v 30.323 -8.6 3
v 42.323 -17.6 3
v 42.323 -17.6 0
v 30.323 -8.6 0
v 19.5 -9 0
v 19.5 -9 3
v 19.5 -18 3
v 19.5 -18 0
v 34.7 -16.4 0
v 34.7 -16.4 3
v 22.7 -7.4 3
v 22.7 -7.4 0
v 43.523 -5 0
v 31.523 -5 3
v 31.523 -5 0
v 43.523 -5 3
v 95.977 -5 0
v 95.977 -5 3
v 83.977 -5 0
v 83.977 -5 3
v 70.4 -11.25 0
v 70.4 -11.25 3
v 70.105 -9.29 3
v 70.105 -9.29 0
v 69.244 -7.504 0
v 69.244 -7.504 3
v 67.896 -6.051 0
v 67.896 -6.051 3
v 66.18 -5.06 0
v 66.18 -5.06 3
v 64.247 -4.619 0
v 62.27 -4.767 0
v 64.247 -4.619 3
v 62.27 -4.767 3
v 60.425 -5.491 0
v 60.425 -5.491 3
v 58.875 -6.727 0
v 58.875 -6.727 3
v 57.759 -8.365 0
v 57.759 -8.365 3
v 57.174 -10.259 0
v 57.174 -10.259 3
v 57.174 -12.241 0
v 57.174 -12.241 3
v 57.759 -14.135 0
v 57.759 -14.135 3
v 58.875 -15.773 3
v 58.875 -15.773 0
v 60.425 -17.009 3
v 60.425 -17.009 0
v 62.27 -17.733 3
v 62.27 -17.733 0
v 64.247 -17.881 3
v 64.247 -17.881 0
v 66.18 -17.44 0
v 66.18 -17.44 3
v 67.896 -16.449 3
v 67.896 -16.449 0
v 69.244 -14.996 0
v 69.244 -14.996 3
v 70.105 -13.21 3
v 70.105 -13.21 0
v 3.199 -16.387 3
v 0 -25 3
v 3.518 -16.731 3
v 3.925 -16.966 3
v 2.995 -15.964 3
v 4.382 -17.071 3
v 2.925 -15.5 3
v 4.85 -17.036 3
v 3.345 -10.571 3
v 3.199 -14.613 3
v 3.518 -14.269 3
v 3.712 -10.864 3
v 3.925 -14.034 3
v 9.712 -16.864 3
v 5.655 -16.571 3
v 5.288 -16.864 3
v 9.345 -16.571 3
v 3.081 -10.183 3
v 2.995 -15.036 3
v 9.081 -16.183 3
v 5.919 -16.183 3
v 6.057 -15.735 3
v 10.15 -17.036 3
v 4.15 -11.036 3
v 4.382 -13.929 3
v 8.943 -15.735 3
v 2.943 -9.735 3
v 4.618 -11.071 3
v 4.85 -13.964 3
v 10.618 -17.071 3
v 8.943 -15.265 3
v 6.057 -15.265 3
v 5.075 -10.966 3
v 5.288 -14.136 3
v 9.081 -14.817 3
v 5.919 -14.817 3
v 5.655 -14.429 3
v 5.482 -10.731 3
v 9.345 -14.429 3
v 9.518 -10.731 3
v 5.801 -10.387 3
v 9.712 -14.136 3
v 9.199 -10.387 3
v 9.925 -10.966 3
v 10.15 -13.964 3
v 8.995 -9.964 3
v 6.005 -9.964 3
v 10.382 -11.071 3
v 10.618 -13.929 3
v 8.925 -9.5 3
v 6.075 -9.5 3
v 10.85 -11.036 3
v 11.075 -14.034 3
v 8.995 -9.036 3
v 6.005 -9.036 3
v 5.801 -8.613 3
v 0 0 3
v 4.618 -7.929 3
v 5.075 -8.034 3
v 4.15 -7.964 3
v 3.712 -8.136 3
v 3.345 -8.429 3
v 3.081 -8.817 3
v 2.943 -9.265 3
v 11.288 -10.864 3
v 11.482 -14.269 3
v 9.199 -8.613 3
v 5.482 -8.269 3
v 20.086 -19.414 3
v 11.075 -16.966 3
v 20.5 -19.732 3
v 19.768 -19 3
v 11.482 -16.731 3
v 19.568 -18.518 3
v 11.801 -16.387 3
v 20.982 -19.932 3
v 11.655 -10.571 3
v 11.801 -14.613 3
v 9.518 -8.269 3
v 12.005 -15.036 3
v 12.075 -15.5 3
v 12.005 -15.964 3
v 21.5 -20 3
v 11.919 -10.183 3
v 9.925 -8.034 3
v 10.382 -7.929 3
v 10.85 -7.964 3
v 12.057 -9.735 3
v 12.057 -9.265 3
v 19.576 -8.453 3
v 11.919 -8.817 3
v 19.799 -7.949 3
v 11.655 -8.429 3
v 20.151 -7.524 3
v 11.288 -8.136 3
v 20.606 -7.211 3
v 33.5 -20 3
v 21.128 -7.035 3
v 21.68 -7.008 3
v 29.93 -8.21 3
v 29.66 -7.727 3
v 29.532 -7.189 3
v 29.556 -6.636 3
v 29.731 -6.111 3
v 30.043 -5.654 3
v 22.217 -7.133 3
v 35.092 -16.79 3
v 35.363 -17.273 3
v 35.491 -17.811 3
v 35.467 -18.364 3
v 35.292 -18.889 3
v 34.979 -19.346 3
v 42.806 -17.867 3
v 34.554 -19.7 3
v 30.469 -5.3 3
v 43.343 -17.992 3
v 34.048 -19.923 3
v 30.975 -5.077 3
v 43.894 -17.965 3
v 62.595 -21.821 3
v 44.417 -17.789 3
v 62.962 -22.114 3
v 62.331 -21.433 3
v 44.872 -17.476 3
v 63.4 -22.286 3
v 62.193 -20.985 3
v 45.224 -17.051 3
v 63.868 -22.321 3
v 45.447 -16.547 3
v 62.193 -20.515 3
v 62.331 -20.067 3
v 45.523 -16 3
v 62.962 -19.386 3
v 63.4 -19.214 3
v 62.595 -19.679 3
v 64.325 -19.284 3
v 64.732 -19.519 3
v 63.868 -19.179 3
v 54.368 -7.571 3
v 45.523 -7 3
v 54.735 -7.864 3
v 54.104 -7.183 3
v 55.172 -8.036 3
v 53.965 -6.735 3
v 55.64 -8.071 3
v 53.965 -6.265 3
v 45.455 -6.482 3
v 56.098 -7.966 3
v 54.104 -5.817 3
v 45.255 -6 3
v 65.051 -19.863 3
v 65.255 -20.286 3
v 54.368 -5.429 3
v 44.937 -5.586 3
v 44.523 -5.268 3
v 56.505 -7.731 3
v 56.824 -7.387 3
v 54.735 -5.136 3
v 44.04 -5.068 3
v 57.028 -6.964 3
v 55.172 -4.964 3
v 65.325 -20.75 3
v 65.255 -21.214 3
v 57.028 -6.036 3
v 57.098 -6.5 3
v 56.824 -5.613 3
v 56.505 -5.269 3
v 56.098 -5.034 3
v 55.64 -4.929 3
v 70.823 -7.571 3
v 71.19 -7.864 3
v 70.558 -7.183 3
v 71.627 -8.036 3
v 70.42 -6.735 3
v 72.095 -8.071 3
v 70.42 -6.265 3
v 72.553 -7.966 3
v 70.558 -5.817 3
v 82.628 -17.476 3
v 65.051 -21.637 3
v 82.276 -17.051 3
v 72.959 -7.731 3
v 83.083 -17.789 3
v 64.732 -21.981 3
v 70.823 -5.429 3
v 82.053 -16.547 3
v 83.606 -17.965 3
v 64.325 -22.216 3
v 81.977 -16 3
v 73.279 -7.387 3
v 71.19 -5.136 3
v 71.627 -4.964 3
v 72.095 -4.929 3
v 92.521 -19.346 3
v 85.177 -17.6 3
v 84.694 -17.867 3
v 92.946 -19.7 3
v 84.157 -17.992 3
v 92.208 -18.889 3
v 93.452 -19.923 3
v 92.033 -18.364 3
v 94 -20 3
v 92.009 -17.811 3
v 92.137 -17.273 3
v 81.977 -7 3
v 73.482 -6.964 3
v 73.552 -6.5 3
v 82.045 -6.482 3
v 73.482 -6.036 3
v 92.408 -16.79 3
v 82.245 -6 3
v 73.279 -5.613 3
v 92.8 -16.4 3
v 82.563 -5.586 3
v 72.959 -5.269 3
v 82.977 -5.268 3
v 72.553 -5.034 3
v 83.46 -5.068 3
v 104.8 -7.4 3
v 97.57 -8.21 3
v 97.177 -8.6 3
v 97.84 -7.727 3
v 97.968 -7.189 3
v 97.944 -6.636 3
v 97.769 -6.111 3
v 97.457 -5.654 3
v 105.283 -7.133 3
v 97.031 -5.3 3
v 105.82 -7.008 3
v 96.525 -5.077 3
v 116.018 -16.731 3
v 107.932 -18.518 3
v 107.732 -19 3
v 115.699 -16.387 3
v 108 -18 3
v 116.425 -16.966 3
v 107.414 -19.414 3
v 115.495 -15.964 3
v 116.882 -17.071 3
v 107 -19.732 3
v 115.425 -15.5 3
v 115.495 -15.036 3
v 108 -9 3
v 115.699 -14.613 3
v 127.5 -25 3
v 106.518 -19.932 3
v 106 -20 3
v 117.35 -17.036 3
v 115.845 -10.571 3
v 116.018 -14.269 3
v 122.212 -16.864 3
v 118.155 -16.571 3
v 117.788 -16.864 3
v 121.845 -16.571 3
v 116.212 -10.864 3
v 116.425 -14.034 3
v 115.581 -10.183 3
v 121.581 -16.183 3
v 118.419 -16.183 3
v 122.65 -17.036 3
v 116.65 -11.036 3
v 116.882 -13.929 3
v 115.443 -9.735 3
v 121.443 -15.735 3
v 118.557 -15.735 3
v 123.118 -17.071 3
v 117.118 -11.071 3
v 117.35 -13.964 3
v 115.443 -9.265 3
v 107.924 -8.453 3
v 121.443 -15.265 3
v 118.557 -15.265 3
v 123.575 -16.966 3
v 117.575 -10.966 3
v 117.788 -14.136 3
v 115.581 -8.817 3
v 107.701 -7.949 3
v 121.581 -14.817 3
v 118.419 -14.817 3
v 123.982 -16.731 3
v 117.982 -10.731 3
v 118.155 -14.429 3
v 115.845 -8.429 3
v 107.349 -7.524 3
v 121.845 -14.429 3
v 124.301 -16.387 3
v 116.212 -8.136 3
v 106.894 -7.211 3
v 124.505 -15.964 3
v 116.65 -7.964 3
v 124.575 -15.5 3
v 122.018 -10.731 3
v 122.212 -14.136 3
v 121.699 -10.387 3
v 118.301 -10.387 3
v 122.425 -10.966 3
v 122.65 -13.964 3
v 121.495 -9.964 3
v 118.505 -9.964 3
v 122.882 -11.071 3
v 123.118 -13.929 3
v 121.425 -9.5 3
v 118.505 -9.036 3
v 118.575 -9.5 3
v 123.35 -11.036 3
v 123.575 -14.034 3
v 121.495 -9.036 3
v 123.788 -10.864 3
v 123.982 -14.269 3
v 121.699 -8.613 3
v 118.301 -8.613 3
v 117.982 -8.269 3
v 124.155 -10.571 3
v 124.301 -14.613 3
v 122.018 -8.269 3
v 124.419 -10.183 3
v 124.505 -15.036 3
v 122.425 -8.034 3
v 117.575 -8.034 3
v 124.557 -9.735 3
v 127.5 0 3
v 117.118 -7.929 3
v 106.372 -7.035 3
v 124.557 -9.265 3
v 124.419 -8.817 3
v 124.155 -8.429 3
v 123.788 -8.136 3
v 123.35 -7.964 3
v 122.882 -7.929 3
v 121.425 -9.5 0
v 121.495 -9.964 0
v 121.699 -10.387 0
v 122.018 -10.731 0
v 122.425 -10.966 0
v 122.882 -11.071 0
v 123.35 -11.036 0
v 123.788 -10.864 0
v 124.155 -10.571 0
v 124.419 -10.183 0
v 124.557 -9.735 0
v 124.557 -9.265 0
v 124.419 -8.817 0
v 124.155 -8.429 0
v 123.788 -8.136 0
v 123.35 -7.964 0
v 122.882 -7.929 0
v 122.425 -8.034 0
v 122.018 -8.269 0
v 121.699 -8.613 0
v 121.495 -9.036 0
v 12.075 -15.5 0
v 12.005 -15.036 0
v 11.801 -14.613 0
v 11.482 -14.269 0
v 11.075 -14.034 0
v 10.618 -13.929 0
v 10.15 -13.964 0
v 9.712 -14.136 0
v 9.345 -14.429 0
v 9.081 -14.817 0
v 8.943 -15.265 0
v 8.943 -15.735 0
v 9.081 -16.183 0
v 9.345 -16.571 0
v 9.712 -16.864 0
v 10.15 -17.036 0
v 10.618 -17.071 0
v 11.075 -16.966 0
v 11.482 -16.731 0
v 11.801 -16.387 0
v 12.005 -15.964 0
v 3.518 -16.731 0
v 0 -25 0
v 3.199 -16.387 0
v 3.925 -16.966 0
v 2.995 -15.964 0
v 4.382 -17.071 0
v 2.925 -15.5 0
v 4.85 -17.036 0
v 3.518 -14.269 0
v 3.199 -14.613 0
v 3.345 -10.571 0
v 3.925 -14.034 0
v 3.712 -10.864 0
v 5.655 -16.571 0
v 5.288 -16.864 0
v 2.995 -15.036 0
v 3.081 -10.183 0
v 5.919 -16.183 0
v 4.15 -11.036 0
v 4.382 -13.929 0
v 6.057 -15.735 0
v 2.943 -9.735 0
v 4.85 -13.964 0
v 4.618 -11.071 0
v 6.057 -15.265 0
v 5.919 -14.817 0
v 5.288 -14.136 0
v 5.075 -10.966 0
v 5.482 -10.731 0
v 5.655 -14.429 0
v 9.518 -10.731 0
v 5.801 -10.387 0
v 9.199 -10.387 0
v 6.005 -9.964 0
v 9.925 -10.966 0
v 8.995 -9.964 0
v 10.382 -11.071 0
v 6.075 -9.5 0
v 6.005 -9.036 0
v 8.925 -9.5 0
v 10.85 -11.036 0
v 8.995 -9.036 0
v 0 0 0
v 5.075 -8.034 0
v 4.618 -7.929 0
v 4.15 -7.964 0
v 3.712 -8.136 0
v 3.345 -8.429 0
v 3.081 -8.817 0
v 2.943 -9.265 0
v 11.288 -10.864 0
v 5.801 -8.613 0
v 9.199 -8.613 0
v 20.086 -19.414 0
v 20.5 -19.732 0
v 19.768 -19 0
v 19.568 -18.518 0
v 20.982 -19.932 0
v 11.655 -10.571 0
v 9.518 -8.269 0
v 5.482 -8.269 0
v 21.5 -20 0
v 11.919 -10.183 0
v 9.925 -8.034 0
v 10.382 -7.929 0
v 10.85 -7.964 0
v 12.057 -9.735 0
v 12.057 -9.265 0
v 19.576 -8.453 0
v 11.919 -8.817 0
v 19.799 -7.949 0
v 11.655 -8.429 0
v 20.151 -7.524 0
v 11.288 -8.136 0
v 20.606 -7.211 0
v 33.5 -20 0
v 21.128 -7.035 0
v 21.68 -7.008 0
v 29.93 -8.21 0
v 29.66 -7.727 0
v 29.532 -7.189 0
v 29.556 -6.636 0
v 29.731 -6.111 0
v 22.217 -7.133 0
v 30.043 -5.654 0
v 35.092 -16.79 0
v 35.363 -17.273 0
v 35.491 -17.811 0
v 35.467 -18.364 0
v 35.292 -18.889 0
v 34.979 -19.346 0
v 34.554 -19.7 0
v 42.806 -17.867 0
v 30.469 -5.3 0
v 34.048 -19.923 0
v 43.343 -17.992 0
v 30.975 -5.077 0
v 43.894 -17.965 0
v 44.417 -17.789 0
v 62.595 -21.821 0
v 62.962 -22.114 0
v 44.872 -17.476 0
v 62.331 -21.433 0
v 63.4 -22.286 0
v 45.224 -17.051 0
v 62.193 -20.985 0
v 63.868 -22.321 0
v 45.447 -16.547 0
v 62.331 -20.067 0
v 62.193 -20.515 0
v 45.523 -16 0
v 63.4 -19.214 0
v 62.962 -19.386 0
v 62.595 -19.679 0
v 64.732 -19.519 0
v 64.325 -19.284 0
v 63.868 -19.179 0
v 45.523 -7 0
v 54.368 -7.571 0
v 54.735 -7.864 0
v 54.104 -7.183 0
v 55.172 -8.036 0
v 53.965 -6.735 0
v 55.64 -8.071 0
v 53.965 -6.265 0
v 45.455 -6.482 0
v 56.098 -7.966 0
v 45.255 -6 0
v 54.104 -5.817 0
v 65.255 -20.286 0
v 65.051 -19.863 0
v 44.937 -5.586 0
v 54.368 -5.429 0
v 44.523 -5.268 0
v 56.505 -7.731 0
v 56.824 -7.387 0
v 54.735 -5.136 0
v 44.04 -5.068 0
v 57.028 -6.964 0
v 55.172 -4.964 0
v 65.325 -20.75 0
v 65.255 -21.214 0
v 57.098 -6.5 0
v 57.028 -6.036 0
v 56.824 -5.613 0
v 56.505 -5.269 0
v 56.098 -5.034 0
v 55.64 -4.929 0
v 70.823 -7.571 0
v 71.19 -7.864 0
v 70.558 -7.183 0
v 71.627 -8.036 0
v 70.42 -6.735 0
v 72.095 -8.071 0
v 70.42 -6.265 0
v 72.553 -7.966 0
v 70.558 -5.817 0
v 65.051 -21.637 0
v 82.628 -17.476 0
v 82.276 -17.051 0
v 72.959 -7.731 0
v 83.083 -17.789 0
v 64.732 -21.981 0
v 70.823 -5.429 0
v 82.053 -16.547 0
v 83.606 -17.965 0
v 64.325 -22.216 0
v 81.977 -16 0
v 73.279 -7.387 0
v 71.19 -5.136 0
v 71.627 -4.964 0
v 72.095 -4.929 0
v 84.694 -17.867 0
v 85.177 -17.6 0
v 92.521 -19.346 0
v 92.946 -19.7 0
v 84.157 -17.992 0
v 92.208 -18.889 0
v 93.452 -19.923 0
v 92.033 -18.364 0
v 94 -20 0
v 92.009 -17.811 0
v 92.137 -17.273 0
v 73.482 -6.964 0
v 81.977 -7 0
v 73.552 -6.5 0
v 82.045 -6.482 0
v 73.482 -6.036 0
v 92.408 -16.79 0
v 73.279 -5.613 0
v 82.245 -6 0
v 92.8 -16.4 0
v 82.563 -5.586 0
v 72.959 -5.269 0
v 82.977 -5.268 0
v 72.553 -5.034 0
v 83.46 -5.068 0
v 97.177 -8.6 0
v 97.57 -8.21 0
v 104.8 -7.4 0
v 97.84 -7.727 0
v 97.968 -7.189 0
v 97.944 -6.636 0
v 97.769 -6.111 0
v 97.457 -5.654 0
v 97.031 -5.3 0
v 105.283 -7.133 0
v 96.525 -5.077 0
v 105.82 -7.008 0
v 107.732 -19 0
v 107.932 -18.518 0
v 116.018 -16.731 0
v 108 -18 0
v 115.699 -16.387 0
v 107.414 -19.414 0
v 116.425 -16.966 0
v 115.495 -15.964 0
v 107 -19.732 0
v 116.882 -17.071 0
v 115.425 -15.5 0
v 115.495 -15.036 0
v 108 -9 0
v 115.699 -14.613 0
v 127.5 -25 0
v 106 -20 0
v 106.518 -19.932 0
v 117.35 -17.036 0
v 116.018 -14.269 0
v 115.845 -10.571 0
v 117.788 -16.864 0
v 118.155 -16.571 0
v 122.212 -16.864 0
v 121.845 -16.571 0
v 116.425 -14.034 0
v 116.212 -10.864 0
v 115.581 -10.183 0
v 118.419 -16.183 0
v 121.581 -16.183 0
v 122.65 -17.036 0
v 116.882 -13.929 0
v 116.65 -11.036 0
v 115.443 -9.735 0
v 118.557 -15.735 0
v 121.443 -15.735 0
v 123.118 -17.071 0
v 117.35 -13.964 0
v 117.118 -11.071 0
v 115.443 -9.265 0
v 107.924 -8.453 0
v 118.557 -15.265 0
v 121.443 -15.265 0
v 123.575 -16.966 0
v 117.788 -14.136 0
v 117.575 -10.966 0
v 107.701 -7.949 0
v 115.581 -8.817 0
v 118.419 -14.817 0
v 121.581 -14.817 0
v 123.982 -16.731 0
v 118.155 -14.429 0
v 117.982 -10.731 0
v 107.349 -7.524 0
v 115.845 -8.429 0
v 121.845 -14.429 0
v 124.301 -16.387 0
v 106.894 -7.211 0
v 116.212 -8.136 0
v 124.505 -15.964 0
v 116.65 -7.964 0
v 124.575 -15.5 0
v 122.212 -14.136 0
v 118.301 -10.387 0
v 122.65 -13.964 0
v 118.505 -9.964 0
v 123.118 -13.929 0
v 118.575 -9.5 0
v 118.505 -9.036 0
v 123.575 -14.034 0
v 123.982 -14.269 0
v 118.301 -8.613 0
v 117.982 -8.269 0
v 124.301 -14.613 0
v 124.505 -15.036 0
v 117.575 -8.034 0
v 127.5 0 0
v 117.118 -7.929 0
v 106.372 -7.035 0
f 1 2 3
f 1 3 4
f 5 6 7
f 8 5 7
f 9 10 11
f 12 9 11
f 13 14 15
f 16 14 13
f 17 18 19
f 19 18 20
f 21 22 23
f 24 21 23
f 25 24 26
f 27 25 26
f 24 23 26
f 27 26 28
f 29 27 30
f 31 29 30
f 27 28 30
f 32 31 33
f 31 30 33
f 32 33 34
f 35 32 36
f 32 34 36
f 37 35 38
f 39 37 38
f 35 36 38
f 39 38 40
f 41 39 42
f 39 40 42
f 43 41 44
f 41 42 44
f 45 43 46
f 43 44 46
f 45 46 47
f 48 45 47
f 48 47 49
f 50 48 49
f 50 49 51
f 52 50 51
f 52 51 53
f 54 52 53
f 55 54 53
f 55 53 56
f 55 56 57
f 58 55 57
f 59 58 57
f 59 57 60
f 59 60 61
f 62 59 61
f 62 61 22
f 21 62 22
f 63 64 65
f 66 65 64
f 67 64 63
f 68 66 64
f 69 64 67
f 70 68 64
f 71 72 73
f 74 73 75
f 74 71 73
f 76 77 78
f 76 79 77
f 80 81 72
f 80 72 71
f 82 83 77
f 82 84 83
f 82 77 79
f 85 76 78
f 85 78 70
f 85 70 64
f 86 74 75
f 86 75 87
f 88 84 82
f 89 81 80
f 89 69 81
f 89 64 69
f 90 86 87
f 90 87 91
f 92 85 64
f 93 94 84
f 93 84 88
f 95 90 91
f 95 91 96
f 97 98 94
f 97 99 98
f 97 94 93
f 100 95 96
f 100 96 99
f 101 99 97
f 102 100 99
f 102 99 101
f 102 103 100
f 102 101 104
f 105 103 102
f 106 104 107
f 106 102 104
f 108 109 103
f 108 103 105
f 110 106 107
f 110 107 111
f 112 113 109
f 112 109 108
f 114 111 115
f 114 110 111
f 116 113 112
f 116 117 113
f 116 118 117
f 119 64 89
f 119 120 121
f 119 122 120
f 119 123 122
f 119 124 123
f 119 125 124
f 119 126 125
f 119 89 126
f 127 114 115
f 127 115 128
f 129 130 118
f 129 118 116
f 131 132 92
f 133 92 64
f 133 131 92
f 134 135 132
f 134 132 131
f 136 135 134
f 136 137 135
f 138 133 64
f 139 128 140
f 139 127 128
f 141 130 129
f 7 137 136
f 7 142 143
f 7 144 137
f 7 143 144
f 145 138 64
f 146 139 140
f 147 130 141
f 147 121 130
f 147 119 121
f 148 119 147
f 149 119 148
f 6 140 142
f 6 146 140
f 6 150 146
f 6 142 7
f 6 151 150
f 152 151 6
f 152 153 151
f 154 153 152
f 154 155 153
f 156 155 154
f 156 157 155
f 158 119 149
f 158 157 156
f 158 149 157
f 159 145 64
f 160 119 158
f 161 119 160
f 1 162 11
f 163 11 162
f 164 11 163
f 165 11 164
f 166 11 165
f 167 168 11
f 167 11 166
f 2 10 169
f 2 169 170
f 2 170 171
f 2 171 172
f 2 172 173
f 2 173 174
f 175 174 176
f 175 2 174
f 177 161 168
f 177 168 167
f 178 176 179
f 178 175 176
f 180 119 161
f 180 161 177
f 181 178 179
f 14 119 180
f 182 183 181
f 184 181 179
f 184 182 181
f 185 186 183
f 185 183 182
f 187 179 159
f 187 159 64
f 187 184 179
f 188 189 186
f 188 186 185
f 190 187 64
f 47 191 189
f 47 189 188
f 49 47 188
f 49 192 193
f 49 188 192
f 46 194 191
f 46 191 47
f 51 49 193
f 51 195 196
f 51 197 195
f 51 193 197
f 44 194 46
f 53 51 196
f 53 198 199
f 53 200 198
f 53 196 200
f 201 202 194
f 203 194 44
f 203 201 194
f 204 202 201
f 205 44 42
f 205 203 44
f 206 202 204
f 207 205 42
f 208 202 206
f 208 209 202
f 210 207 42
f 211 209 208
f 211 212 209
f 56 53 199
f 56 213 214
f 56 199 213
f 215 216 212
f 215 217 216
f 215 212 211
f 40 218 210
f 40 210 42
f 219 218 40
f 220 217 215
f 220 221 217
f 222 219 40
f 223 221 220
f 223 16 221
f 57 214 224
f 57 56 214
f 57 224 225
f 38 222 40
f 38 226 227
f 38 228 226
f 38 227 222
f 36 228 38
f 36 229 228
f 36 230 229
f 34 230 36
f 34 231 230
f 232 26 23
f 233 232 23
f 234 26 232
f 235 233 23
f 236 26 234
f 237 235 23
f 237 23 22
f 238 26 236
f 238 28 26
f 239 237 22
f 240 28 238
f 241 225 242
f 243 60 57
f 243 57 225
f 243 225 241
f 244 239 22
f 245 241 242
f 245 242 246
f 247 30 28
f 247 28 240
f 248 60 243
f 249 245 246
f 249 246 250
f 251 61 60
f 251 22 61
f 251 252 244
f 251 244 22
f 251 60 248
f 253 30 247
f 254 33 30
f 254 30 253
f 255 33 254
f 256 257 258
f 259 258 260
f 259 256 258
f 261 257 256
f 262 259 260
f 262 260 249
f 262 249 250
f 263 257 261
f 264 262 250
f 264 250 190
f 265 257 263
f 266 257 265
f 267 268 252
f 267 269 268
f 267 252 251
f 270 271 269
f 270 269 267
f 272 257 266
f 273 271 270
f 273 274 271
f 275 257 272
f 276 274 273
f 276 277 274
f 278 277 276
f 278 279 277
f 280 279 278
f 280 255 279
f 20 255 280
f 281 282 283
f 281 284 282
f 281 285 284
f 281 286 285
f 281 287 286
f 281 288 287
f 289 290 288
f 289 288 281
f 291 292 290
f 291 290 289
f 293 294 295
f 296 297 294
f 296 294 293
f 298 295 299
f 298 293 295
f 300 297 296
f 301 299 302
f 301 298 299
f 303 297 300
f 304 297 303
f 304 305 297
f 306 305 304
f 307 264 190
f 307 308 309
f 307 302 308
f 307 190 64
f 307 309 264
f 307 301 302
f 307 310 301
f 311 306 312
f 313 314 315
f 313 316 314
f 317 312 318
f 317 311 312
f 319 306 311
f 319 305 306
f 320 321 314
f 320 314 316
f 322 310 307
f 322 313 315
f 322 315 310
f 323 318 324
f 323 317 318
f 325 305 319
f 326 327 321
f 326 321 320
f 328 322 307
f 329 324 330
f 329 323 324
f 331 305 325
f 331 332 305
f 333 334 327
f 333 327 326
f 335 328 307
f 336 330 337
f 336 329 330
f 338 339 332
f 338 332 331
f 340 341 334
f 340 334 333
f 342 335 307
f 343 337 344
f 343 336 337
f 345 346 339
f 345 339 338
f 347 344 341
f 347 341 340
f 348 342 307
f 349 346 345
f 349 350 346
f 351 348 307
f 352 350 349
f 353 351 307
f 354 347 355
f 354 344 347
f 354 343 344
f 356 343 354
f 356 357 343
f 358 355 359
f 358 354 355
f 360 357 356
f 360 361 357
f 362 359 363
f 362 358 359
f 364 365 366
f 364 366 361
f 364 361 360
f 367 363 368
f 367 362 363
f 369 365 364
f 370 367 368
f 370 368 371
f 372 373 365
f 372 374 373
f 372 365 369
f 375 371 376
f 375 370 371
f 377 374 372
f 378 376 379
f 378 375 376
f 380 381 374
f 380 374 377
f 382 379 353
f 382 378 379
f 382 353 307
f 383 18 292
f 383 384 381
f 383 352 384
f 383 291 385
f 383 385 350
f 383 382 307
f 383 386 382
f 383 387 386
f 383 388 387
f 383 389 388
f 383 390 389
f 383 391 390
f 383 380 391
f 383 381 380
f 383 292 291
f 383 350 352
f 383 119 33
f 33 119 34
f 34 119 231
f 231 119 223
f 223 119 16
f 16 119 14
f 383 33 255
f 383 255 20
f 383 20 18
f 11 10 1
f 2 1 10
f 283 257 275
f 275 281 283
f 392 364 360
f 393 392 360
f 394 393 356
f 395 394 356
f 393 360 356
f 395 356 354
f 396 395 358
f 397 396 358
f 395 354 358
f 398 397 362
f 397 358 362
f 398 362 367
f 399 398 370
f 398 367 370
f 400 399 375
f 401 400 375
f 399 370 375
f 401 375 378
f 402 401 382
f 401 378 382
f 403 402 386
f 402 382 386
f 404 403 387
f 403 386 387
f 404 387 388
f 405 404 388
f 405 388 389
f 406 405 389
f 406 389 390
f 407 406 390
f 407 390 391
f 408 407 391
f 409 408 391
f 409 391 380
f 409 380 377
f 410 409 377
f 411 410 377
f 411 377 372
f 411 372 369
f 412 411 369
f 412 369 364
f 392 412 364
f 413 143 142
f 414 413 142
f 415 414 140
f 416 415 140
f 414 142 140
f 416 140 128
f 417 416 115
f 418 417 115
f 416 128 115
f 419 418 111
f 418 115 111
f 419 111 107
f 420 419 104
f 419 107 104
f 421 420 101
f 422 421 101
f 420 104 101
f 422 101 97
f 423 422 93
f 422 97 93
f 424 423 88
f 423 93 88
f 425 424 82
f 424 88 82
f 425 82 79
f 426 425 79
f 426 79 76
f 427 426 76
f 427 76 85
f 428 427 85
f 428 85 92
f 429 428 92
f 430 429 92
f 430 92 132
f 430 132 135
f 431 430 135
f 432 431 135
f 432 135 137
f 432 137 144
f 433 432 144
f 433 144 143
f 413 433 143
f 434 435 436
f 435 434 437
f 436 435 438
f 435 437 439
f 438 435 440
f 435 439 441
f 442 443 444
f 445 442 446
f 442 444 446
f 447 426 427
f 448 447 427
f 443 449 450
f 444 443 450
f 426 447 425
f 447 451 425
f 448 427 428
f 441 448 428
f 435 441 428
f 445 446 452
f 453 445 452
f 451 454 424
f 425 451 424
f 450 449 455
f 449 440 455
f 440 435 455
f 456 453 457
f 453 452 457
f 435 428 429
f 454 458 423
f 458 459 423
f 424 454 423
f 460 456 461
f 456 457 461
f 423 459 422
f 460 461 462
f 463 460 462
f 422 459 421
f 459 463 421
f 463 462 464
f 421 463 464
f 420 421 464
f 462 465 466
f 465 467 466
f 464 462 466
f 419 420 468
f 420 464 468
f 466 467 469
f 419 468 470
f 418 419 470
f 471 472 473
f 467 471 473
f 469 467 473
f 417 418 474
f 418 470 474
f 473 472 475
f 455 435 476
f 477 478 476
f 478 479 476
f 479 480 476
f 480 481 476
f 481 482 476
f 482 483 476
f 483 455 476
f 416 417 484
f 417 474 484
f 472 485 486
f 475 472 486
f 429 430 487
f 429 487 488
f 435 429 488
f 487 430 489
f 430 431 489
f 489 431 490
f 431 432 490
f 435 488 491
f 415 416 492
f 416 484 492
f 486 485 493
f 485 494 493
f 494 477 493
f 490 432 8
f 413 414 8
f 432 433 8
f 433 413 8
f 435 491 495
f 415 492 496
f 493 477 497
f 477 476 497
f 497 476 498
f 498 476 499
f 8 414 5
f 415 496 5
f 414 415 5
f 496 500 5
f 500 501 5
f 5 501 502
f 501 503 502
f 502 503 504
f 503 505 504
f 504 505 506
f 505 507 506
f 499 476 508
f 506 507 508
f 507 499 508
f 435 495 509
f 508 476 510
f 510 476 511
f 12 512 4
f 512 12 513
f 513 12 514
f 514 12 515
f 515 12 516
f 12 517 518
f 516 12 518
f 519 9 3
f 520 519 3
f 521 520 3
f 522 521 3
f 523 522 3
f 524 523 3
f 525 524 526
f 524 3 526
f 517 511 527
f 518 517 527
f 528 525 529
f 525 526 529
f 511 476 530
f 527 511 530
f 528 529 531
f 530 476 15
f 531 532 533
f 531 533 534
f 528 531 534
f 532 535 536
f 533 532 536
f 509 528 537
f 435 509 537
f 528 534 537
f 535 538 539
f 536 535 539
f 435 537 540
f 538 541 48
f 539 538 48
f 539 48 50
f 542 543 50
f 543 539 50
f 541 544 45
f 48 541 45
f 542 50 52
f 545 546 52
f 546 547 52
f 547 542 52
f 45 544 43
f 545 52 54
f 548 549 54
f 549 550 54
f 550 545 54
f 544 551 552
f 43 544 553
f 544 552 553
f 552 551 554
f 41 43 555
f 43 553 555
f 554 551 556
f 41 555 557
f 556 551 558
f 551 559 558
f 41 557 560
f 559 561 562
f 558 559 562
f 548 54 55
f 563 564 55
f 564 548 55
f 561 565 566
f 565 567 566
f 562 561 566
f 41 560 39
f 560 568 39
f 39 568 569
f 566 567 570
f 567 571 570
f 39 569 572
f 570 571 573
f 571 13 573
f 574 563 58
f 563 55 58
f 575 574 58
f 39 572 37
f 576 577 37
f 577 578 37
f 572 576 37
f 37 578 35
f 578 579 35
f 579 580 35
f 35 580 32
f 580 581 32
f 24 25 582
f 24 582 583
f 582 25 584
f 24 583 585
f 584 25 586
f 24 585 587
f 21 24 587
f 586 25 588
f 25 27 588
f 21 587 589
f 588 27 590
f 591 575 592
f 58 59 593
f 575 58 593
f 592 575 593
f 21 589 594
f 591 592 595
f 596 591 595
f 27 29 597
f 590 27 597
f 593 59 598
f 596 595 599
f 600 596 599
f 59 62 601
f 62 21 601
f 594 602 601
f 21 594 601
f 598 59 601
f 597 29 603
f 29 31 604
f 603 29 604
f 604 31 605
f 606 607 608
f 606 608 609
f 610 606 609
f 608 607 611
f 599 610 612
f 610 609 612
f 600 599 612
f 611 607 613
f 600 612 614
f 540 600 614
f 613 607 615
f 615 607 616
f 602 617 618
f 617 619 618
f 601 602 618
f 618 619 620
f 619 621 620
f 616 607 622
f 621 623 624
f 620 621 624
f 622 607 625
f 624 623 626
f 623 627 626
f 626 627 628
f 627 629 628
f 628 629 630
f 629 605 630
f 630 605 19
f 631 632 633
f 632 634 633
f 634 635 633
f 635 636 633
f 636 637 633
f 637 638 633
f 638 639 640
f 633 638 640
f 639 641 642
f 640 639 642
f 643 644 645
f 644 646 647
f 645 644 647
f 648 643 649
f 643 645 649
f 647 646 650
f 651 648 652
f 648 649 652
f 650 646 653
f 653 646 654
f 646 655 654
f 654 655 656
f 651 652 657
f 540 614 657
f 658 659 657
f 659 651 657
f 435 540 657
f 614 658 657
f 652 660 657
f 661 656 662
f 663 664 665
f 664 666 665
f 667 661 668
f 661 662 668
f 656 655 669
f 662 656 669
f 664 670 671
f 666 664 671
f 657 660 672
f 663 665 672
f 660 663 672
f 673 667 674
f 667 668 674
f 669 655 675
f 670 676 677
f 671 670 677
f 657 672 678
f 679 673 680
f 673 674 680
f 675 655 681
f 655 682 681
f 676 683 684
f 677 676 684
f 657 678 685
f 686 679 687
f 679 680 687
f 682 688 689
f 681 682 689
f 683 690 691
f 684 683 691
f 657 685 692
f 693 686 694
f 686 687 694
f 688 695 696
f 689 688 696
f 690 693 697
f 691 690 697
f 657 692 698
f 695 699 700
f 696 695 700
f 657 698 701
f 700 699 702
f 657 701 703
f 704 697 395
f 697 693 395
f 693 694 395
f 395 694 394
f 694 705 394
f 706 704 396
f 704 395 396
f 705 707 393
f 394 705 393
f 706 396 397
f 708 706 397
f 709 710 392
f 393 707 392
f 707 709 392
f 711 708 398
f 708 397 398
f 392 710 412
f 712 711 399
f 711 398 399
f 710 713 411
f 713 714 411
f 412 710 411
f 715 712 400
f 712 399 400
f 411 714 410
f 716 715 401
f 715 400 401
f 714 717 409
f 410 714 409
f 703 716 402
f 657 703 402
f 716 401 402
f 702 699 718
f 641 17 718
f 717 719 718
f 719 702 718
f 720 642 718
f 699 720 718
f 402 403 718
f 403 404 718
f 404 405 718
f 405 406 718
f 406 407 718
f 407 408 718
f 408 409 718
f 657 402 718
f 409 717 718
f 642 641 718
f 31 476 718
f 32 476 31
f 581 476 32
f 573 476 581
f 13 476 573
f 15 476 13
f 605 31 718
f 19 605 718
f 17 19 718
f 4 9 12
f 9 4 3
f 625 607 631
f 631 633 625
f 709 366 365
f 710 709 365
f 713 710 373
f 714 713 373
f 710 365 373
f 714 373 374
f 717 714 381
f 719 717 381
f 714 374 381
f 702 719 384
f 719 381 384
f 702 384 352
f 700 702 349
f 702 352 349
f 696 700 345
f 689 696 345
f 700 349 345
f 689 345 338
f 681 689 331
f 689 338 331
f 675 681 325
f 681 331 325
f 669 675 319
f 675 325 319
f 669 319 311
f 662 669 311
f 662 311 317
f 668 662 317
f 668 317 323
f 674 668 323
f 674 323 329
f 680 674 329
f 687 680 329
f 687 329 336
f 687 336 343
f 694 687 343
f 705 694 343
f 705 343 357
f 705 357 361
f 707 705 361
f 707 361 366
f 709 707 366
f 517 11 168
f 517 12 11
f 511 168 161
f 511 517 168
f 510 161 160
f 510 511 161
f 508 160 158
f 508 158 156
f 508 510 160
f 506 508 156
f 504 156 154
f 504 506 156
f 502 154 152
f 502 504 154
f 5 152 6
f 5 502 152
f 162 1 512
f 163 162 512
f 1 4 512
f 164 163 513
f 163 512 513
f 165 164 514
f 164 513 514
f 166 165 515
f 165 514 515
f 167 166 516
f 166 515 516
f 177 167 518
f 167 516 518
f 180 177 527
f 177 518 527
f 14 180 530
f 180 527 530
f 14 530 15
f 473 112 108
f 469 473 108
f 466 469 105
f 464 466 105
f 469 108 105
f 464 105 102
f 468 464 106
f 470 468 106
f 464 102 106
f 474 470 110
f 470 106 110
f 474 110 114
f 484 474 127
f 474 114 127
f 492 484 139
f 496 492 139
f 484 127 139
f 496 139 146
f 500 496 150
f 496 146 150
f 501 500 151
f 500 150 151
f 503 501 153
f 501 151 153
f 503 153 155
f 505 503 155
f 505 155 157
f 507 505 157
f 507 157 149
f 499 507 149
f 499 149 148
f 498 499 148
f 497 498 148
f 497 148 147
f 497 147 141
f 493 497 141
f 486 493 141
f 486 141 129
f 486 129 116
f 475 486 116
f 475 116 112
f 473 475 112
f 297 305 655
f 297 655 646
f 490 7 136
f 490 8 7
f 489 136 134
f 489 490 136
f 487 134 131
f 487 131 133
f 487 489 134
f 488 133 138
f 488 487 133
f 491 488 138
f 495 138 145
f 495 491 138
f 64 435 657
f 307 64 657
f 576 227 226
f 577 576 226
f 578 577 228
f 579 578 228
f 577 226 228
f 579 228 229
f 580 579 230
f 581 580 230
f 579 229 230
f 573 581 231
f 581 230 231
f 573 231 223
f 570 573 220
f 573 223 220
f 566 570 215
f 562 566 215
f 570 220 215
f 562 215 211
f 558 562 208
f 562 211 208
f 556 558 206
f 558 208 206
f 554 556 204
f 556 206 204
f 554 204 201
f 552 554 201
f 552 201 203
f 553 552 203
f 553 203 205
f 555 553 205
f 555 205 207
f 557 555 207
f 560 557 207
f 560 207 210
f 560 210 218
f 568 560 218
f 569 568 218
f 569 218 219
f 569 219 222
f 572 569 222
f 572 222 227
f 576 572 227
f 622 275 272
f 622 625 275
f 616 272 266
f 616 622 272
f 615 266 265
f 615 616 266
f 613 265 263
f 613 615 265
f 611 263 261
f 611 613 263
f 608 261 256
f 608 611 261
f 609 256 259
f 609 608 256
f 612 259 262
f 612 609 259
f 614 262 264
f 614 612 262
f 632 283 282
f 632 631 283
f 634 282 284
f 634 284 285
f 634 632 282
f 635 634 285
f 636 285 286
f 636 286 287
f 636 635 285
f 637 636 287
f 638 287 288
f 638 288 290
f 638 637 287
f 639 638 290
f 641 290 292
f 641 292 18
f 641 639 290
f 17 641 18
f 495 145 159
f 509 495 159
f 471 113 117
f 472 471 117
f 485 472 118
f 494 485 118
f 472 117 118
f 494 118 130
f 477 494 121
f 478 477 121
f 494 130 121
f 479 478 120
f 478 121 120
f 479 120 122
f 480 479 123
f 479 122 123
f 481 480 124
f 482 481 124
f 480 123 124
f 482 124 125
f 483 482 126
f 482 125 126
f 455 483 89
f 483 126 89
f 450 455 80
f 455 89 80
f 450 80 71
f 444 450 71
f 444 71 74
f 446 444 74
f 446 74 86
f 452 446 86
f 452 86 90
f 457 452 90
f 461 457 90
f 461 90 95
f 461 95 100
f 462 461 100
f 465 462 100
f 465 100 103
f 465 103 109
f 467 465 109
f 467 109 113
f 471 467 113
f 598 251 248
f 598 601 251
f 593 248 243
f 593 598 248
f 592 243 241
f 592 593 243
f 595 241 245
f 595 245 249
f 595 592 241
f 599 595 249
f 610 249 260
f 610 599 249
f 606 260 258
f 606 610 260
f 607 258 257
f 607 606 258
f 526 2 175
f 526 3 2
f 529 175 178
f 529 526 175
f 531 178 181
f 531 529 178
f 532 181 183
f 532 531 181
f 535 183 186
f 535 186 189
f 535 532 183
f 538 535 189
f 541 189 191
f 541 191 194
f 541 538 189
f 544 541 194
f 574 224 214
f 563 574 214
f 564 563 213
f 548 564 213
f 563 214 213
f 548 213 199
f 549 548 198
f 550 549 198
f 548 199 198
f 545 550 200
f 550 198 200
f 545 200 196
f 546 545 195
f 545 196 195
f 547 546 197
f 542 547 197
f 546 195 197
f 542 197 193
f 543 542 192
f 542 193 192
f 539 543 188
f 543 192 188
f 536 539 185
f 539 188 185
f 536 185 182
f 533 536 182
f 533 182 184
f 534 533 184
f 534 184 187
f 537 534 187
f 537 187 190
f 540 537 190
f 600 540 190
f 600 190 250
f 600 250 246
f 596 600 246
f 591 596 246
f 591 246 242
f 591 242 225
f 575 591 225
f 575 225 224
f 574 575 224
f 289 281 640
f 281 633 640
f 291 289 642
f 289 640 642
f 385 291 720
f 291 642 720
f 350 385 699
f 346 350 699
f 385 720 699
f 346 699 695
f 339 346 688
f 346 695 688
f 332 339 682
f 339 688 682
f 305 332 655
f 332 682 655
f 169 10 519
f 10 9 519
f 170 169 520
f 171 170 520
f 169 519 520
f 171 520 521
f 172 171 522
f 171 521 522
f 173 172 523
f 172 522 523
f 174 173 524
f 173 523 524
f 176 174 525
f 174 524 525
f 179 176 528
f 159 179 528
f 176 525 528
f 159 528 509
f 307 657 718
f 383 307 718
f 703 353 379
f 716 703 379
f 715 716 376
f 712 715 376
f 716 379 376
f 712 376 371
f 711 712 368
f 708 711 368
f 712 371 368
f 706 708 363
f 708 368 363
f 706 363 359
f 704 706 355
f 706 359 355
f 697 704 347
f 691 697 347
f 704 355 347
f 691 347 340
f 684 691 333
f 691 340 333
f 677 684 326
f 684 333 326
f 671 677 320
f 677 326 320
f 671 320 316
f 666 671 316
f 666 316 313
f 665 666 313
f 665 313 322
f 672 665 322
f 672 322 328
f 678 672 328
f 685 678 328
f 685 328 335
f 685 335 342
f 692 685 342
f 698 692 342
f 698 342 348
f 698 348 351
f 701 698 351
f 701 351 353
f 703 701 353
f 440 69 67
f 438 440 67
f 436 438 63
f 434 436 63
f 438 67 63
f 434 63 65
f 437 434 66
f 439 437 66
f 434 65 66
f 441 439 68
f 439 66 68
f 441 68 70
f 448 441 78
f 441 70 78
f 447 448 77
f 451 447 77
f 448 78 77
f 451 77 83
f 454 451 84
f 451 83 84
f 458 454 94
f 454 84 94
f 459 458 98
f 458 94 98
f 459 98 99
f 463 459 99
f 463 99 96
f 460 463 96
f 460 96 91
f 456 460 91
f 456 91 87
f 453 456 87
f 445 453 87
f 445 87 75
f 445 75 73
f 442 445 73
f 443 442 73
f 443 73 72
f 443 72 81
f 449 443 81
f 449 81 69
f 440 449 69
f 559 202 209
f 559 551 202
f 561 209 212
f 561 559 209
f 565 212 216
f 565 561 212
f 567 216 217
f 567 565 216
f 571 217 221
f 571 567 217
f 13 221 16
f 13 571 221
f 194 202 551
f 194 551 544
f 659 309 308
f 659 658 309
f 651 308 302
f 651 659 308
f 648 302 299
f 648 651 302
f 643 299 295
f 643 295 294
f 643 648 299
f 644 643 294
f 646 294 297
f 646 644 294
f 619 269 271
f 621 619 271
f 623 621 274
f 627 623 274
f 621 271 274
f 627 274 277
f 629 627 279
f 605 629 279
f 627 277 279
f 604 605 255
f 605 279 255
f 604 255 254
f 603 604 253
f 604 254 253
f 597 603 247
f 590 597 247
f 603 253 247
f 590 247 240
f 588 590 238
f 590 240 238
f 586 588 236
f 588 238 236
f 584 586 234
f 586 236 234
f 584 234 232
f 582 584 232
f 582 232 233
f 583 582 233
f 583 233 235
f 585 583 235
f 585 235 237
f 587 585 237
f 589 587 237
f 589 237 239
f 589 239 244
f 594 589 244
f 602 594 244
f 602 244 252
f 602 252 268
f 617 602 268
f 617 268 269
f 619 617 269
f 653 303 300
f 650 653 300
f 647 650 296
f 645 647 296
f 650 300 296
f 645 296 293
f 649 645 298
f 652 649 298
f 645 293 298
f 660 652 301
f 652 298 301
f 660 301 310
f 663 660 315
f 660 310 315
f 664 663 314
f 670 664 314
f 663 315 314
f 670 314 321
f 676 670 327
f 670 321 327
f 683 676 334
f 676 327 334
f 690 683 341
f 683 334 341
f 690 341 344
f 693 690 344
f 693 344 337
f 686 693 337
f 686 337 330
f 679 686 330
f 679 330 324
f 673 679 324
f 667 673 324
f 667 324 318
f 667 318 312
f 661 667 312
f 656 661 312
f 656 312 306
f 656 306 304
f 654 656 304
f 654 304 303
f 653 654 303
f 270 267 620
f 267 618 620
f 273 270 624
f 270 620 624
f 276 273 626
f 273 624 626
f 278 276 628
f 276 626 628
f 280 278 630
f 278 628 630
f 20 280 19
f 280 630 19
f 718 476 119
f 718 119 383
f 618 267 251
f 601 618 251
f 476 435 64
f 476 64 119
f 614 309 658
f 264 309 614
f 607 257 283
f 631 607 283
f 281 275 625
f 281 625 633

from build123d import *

# Parameters (mm, degrees)
SKETCH_1_W          = 127.5
SKETCH_1_H          = 25
EXTRUDE_1_DEPTH     = 3
SKETCH_2_R          = 1.575
SKETCH_2_R_2        = 6.65
CUT_EXTRUDE_1_DEPTH = 130.96249459
FILLET_1_R          = 2


with BuildPart() as part:
    # 草图1 → 凸台-拉伸1 (new body)
    with BuildSketch(Plane.XY):
        with Locations((63.75, -12.5)):
            Rectangle(SKETCH_1_W, SKETCH_1_H)
    extrude(amount=EXTRUDE_1_DEPTH)

    # 草图2 → 切除-拉伸1 (cut, through all)
    with BuildSketch(Plane.XY.offset(3)):
        with Locations((4.5, -9.5)):
            Circle(SKETCH_2_R)
        with Locations(Location((10.5, -9.5, 0), (0, 0, 180))):
            Circle(SKETCH_2_R)
        with Locations((10.5, -15.5)):
            Circle(SKETCH_2_R)
        with Locations(Location((4.5, -15.5, 0), (0, 0, 180))):
            Circle(SKETCH_2_R)
        with Locations((123, -15.5)):
            Circle(SKETCH_2_R)
        with Locations(Location((117, -15.5, 0), (0, 0, 180))):
            Circle(SKETCH_2_R)
        with Locations((117, -9.5)):
            Circle(SKETCH_2_R)
        with Locations(Location((123, -9.5, 0), (0, 0, 180))):
            Circle(SKETCH_2_R)
        with Locations((63.75, -11.25)):
            Circle(SKETCH_2_R_2)
        with Locations((55.522758664, -6.5)):
            Circle(SKETCH_2_R)
        with Locations((71.977241336, -6.5)):
            Circle(SKETCH_2_R)
        with Locations((63.75, -20.75)):
            Circle(SKETCH_2_R)
        Polygon((108, -5), (108, -20), (88, -20), align=None)
        Polygon((81.977241336, -5), (81.977241336, -20), (101.977241336, -5), align=None)
        Polygon((25.522758664, -5), (45.522758664, -5), (45.522758664, -20), align=None)
        Polygon((39.5, -20), (19.5, -5), (19.5, -20), align=None)
    extrude(amount=-CUT_EXTRUDE_1_DEPTH, mode=Mode.SUBTRACT)

    # 圆角1
    fillet_1_edges = [part.edges().sort_by_distance(p)[0] for p in [
        (45.522758664, -20, 1.5),
        (25.522758664, -5, 1.5),
        (45.522758664, -5, 1.5),
        (39.5, -20, 1.5),
        (19.5, -20, 1.5),
        (19.5, -5, 1.5),
        (81.977241336, -5, 1.5),
        (101.977241336, -5, 1.5),
        (81.977241336, -20, 1.5),
        (88, -20, 1.5),
        (108, -5, 1.5),
        (108, -20, 1.5),
    ]]
    fillet(fillet_1_edges, radius=FILLET_1_R)


solid = part.part
